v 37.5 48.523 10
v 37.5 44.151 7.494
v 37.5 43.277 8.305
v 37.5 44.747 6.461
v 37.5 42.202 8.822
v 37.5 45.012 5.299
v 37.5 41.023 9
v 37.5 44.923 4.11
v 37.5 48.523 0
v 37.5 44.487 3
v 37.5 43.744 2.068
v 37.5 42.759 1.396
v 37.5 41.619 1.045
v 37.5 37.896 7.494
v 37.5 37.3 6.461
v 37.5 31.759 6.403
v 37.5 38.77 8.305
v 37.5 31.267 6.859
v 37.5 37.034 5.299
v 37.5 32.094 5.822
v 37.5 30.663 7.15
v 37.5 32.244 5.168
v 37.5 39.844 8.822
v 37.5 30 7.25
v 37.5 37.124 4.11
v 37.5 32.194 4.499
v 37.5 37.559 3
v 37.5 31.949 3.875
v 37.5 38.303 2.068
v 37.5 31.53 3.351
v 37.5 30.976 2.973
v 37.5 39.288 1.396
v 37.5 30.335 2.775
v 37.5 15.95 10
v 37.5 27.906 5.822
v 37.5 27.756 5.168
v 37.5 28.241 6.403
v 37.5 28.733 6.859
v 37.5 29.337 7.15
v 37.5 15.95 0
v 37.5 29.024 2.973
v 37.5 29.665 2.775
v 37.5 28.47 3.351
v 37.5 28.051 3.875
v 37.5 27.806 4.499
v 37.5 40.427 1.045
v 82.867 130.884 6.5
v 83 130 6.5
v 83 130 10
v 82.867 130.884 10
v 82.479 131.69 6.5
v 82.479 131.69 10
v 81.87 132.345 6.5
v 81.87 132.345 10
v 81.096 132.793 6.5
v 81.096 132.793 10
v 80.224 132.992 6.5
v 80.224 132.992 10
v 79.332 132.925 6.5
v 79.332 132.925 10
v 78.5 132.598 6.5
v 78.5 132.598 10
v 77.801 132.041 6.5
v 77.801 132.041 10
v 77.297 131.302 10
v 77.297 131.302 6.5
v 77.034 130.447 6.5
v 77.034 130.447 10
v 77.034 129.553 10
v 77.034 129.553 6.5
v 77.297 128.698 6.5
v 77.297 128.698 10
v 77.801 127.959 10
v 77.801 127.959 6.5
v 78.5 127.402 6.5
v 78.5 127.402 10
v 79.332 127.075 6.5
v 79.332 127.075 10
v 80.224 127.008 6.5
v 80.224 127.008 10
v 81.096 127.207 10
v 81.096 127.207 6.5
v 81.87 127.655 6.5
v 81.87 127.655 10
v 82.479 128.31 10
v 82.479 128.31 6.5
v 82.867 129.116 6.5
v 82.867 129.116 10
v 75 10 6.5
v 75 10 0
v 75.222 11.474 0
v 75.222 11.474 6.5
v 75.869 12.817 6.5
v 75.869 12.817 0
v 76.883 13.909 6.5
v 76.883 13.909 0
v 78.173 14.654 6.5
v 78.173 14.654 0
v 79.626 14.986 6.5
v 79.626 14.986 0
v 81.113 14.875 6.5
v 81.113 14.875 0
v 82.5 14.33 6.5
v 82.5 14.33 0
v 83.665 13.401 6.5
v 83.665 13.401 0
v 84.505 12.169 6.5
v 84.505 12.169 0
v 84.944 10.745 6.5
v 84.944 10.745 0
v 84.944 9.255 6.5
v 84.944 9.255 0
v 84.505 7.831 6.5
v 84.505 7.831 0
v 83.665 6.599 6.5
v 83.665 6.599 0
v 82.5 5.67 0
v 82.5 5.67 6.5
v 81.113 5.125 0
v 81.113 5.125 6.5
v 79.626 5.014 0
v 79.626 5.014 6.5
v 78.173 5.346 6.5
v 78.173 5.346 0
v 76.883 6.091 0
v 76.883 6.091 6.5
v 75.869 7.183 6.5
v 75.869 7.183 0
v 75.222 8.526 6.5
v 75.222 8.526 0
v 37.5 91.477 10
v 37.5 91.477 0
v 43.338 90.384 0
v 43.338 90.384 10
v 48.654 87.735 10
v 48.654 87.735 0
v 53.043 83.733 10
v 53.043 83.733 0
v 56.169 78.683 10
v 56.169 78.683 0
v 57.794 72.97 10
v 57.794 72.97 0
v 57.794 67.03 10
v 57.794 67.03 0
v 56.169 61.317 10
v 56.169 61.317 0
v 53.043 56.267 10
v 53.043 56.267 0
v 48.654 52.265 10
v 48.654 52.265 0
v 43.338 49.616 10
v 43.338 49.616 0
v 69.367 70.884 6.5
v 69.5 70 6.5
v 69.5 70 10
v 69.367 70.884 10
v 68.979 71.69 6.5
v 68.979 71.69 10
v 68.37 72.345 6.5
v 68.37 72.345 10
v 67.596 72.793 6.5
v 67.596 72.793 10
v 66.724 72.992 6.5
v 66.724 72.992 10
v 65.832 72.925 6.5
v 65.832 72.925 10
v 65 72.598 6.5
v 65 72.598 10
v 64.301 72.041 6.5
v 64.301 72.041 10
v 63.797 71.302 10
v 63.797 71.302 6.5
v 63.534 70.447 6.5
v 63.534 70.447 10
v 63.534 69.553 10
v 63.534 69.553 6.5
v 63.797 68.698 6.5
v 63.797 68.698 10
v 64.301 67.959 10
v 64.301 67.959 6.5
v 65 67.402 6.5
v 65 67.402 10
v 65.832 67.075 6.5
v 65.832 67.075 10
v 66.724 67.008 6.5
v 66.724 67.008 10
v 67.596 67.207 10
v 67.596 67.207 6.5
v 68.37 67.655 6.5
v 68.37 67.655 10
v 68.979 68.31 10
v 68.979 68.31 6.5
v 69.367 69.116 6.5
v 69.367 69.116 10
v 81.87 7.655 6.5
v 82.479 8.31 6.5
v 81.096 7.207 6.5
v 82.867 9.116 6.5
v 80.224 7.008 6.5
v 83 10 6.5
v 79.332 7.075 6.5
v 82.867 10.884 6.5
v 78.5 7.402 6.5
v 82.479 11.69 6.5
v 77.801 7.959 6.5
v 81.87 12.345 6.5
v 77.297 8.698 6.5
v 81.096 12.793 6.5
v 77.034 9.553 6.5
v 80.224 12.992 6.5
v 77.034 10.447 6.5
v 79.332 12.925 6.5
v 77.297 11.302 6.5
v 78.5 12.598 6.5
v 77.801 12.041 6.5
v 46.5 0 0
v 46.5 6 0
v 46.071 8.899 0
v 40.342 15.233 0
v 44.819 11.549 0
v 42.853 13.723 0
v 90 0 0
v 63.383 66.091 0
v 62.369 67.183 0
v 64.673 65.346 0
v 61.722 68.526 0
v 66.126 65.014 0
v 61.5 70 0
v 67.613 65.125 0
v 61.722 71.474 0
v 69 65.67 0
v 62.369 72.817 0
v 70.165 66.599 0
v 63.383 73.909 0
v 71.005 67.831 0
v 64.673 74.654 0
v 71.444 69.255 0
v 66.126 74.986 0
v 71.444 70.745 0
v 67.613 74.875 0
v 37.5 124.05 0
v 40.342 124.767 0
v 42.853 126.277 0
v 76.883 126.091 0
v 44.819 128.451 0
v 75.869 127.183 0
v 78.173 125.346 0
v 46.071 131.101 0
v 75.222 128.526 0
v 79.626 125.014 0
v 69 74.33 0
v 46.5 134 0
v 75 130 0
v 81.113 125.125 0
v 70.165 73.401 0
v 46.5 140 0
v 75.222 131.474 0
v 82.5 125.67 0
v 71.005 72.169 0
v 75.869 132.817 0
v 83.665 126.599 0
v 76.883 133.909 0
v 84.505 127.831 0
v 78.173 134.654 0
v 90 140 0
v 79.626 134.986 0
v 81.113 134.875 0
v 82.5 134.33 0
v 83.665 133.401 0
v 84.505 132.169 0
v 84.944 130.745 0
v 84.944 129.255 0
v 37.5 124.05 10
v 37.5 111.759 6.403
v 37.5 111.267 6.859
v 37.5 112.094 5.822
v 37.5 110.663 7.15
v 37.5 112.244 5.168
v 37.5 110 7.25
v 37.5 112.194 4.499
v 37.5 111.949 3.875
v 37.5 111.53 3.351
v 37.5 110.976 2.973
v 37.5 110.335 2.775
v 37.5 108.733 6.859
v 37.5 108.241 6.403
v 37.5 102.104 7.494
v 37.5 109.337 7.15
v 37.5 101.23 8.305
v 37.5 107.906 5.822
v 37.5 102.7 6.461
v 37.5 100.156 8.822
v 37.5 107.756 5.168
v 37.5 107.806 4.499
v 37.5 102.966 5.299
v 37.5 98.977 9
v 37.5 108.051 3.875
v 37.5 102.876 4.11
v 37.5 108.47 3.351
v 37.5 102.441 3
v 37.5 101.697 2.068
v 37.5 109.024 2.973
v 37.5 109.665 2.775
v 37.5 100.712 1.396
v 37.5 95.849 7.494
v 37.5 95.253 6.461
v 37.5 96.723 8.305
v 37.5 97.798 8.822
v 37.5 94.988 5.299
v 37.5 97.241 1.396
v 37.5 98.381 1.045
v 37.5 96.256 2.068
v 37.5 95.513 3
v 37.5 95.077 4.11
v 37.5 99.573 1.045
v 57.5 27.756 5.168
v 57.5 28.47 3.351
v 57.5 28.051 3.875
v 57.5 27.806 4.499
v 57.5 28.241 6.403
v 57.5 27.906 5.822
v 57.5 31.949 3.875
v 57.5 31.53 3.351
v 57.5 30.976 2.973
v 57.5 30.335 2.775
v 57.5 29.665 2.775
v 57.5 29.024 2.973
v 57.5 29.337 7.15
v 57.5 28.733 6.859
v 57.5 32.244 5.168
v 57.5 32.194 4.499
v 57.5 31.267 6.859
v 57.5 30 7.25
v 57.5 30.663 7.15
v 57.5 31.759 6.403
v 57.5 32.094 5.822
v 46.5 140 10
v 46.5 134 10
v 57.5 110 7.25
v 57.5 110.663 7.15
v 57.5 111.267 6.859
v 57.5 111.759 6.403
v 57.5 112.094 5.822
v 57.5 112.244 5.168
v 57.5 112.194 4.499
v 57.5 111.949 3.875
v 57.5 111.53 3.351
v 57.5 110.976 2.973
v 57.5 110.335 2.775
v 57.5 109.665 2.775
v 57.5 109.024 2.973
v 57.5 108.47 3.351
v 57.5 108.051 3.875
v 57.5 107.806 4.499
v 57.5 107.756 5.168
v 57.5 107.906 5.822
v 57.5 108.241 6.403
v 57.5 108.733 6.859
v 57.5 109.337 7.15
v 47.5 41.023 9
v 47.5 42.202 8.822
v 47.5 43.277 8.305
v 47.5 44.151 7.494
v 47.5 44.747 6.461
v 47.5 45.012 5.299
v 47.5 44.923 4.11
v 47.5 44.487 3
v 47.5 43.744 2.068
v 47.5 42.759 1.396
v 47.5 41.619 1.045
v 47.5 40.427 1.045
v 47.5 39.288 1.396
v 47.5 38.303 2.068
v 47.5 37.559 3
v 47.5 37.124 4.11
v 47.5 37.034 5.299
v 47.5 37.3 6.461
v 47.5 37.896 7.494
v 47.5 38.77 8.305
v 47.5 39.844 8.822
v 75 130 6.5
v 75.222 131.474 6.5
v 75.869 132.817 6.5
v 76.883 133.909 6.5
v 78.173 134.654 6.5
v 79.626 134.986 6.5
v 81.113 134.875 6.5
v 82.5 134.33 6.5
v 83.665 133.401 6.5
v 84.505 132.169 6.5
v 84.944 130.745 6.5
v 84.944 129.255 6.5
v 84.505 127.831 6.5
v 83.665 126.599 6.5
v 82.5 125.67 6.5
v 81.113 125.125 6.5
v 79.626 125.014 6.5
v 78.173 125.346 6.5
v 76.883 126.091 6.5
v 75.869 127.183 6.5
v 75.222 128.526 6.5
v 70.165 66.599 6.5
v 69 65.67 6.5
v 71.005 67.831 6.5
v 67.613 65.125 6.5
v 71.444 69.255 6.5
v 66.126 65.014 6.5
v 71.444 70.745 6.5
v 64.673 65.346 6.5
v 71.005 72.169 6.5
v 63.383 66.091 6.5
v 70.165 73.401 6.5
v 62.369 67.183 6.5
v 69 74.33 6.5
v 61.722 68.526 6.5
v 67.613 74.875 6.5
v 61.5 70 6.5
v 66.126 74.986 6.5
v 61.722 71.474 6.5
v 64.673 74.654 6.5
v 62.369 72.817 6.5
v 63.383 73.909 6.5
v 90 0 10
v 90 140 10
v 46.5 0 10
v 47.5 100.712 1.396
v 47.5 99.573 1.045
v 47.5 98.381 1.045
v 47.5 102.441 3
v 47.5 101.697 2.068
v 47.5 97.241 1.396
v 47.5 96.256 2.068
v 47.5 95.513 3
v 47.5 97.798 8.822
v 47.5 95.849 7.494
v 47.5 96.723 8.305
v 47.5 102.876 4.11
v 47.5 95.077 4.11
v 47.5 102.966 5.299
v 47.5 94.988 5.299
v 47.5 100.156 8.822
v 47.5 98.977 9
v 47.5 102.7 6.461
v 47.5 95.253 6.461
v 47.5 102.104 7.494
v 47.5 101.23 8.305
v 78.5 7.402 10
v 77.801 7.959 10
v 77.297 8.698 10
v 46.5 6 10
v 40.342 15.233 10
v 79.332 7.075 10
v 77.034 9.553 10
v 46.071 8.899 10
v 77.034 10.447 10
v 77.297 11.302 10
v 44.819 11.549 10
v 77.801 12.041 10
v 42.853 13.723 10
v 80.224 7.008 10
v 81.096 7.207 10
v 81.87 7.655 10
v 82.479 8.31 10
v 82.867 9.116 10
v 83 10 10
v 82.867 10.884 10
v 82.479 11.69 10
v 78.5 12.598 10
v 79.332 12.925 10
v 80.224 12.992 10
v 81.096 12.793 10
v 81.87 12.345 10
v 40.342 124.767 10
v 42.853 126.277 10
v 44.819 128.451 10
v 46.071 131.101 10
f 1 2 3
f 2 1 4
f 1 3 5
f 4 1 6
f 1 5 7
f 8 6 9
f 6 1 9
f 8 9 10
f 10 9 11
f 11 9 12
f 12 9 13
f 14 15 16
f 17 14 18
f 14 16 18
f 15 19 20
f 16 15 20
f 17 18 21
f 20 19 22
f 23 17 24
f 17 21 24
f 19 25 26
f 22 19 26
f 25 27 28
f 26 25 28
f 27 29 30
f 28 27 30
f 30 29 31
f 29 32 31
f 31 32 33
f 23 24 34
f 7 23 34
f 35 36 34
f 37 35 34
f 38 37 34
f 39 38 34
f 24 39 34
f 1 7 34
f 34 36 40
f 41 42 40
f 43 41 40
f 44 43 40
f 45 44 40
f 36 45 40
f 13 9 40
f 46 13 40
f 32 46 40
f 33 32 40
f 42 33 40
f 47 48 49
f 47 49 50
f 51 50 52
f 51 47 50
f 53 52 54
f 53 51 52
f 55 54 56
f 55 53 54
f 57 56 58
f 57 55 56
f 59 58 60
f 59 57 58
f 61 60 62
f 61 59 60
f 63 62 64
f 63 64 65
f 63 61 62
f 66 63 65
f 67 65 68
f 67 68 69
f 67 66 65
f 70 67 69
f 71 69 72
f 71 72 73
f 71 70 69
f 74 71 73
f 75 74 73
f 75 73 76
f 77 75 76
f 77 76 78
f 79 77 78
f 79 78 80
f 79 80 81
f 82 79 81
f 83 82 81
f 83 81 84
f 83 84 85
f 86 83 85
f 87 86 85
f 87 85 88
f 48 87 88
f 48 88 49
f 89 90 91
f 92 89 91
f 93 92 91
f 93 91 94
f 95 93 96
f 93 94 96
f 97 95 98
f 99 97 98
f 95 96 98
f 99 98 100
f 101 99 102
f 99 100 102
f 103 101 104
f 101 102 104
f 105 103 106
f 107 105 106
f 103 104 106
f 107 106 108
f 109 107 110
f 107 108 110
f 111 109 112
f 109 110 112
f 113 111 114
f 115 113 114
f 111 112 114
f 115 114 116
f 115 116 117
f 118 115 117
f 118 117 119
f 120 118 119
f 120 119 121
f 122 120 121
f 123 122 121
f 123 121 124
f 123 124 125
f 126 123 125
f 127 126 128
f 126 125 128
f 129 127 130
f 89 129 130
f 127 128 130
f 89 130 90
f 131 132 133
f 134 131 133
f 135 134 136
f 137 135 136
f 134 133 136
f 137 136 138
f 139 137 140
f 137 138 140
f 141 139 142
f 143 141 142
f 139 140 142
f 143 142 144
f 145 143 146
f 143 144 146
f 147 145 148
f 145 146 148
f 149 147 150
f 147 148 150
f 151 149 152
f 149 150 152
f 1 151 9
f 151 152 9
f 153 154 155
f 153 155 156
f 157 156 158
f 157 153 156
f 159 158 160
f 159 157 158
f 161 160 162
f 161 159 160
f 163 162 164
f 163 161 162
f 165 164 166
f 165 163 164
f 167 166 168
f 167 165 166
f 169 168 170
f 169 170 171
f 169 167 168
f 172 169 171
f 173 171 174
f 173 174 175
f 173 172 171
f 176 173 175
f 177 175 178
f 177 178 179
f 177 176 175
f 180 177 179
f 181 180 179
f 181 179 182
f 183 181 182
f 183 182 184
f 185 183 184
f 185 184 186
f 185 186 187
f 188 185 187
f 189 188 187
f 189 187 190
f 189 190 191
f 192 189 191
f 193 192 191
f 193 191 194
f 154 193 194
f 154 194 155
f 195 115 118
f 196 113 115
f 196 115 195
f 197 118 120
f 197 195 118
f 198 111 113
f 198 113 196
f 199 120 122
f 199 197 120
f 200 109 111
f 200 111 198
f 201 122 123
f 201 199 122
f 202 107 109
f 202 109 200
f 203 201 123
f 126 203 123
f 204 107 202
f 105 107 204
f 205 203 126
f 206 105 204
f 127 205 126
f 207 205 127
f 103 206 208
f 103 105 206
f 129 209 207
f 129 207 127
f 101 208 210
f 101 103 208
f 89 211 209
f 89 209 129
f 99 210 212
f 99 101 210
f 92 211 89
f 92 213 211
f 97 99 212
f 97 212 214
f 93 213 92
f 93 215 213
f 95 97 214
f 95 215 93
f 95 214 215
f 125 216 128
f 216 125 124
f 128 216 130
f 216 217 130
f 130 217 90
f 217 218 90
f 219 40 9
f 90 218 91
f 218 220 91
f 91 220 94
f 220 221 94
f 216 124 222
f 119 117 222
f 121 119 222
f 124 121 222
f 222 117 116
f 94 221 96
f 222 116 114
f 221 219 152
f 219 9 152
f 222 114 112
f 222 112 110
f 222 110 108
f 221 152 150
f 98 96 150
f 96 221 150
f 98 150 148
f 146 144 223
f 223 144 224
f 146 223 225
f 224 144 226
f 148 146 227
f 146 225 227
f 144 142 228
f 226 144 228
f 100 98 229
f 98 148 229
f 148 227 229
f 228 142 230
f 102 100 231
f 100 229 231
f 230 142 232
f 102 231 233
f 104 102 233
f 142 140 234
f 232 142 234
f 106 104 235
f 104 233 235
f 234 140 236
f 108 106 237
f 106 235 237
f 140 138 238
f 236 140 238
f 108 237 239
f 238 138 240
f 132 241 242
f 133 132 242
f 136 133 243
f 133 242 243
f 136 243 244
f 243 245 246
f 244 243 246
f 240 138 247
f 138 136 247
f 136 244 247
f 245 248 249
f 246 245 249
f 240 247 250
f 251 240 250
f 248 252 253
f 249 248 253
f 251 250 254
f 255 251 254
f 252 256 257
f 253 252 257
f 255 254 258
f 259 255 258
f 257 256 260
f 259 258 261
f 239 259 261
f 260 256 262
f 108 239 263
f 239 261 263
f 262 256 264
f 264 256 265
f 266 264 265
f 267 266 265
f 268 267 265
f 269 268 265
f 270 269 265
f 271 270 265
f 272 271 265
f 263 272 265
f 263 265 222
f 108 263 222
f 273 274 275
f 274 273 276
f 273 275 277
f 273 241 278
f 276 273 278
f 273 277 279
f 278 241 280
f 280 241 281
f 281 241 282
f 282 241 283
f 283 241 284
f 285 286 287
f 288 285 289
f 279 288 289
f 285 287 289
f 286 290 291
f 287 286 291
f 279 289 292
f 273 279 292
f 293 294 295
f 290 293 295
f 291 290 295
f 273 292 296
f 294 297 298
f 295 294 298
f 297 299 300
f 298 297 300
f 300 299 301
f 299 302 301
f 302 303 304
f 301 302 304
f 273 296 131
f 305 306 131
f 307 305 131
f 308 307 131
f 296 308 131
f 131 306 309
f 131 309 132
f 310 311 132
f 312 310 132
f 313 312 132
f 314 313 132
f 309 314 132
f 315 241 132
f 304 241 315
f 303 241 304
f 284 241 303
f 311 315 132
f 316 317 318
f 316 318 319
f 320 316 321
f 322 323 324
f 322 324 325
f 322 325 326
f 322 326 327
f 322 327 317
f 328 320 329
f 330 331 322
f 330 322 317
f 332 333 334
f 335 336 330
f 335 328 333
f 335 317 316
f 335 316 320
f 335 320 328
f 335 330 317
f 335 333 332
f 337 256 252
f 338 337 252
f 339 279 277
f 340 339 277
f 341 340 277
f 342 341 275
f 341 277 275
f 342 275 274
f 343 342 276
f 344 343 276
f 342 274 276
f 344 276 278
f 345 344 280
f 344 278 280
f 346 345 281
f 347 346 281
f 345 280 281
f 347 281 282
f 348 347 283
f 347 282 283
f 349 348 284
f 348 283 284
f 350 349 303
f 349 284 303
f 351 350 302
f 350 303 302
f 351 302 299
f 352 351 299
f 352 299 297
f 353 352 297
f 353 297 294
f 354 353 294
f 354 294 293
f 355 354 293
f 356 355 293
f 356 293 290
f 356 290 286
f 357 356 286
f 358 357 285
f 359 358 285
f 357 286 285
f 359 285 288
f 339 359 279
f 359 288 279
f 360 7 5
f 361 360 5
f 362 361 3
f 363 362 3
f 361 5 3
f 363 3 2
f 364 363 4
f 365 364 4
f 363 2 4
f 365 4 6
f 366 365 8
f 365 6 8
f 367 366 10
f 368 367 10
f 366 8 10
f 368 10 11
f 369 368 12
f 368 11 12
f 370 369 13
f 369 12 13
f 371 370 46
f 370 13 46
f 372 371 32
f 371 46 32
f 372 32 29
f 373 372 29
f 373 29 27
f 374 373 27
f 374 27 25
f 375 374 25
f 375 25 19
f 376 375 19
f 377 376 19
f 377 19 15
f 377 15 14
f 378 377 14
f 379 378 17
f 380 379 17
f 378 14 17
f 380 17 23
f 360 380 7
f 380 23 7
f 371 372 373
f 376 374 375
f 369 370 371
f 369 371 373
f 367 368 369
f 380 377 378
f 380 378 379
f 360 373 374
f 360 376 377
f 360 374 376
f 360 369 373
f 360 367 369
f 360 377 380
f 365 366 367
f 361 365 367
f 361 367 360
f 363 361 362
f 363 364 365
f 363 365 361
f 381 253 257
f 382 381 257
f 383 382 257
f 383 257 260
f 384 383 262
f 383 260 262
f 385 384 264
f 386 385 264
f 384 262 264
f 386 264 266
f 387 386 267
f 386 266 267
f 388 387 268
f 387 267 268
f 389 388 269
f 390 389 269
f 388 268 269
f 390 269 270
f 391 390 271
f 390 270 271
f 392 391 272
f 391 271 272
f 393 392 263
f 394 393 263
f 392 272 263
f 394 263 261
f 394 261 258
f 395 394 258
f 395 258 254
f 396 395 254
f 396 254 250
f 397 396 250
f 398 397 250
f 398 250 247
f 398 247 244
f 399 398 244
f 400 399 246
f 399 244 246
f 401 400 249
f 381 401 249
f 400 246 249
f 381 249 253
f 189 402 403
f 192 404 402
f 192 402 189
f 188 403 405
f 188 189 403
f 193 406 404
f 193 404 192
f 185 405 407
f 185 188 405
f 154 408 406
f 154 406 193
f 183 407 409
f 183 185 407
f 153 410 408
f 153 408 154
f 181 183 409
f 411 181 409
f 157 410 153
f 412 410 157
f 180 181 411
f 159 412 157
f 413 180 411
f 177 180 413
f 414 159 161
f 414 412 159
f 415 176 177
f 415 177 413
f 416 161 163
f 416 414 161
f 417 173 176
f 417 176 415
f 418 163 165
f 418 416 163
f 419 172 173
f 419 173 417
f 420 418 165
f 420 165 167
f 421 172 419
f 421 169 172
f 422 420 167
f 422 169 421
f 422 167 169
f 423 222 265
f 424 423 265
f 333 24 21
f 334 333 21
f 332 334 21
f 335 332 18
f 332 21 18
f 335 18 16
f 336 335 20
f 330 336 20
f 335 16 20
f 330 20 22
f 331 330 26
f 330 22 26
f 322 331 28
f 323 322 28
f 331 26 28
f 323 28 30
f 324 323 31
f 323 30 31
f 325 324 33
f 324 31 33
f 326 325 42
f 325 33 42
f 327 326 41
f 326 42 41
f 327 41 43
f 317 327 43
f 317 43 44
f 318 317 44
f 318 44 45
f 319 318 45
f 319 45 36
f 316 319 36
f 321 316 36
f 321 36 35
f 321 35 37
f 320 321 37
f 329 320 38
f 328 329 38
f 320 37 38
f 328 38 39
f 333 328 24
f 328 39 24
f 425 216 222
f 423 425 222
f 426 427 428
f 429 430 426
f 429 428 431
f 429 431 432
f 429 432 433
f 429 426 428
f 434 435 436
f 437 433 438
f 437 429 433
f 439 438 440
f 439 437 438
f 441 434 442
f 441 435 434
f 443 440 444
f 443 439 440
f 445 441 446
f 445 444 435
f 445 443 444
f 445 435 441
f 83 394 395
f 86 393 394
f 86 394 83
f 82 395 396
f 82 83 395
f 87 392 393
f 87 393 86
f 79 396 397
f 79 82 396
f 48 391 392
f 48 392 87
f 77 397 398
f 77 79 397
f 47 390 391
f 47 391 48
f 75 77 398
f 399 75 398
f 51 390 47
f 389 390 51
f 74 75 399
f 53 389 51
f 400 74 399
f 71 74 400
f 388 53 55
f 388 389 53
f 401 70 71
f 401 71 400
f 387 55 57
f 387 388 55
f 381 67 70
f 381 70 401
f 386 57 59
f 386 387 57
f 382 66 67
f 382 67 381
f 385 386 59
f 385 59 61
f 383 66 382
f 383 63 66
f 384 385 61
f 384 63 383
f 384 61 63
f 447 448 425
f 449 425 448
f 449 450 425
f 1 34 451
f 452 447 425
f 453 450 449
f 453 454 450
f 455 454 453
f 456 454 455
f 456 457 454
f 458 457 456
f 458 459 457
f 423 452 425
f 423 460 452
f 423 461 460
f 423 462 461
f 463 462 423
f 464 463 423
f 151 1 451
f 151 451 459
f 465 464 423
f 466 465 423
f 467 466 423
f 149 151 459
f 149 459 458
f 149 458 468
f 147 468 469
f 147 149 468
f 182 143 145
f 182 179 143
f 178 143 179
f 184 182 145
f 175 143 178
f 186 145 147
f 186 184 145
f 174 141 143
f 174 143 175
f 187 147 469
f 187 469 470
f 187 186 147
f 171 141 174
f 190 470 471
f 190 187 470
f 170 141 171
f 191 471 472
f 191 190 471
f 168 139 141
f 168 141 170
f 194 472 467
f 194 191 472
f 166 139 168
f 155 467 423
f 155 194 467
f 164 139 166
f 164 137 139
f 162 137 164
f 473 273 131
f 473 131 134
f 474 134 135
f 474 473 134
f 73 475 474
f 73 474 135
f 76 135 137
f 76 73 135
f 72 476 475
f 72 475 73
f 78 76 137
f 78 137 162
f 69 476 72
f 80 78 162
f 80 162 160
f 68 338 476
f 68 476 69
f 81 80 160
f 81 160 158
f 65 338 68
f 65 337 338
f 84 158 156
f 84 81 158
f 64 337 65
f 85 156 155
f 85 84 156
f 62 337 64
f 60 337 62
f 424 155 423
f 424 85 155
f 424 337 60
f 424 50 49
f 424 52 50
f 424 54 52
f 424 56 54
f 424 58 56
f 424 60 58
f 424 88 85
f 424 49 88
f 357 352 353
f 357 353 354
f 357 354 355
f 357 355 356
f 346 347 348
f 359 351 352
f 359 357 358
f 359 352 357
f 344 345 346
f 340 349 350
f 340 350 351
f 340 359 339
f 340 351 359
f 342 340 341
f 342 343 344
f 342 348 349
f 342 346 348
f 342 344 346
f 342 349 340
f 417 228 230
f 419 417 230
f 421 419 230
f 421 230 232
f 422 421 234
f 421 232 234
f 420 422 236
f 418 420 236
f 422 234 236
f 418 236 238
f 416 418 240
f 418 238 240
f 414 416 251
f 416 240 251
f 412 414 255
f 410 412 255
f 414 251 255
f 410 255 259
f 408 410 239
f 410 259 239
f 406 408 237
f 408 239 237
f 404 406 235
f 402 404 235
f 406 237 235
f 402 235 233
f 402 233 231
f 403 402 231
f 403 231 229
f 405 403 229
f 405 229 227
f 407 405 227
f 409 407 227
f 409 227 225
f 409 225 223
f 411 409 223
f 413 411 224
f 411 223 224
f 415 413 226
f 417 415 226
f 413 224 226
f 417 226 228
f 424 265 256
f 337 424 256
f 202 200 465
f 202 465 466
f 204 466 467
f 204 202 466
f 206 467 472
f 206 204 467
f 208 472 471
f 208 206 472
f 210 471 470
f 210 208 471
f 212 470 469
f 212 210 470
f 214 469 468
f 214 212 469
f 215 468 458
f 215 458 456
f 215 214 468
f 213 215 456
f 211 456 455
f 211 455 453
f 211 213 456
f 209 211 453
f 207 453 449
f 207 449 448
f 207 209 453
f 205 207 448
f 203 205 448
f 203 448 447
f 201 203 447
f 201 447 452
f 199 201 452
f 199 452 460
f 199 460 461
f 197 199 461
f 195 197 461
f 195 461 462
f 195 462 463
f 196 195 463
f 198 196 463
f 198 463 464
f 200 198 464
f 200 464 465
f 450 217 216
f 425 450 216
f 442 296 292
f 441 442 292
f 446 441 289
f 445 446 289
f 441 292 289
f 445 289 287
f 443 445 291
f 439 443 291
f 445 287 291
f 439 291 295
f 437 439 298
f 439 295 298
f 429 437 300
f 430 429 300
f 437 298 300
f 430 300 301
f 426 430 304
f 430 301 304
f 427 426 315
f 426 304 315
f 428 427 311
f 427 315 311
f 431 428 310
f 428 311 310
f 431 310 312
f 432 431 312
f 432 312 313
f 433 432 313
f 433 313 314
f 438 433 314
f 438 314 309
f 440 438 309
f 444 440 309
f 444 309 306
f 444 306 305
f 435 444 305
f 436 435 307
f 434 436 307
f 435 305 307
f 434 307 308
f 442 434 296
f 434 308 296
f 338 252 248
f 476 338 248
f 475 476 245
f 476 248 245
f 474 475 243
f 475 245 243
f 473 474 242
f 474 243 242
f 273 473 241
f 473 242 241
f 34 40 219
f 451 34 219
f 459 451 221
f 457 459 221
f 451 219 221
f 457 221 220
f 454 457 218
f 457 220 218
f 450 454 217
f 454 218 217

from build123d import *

# Parameters (mm, degrees)
SKETCH1_R          = 3
EXTRUDE2_DEPTH     = 10
SKETCH5_R          = 5
CUT_EXTRUDE2_DEPTH = 6.5
SKETCH7_R          = 2.25
CUT_EXTRUDE3_DEPTH = 20
SKETCH8_R          = 4
CUT_EXTRUDE4_DEPTH = 10


with BuildPart() as part:
    # Sketch1 → Extrude2 (new body)
    with BuildSketch(Plane.XY):
        with BuildLine():
            ThreePointArc((46.5, 134), (43.916178451, 127.291773917), (37.499940564, 124.050119656))
            Line((37.499940564, 124.050119656), (37.499940564, 100))
            Line((37.499940564, 100), (37.499940564, 91.476734362))
            ThreePointArc((37.499940564, 91.476734362), (58, 70), (37.499940564, 48.523265638))
            Line((37.499940564, 48.523265638), (37.499940564, 39.989097297))
            Line((37.499940564, 39.989097297), (37.499940564, 15.949880344))
            ThreePointArc((37.499940564, 15.949880344), (43.916178451, 12.708226083), (46.5, 6))
            Line((46.5, 6), (46.5, 0))
            Line((46.5, 0), (90, 0))
            Line((90, 0), (90, 140))
            Line((90, 140), (46.5, 140))
            Line((46.5, 140), (46.5, 134))
        make_face()
        with Locations((80, 10)):
            Circle(SKETCH1_R, mode=Mode.SUBTRACT)
        with Locations((66.5, 70)):
            Circle(SKETCH1_R, mode=Mode.SUBTRACT)
        with Locations((80, 130)):
            Circle(SKETCH1_R, mode=Mode.SUBTRACT)
    extrude(amount=EXTRUDE2_DEPTH)

    # Sketch5 → Cut-Extrude2 (cut)
    with BuildSketch(Plane(origin=(0, 0, 0), x_dir=(-1, 0, 0), z_dir=(0, 0, -1))):
        with Locations((-66.5, 70)):
            Circle(SKETCH5_R)
        with Locations((-80, 10)):
            Circle(SKETCH5_R)
        with Locations((-80, 130)):
            Circle(SKETCH5_R)
    extrude(amount=-CUT_EXTRUDE2_DEPTH, mode=Mode.SUBTRACT)

    # Sketch7 → Cut-Extrude3 (cut)
    with BuildSketch(Plane.ZY.offset(-37.499940564)):
        with Locations((5, 110)):
            Circle(SKETCH7_R)
        with Locations((5, 30)):
            Circle(SKETCH7_R)
    extrude(amount=-CUT_EXTRUDE3_DEPTH, mode=Mode.SUBTRACT)

    # Sketch8 → Cut-Extrude4 (cut)
    with BuildSketch(Plane.ZY.offset(-37.499940564)):
        with Locations((5, 41.023265638)):
            Circle(SKETCH8_R)
        with Locations((5, 98.976734362)):
            Circle(SKETCH8_R)
    extrude(amount=-CUT_EXTRUDE4_DEPTH, mode=Mode.SUBTRACT)


solid = part.part
